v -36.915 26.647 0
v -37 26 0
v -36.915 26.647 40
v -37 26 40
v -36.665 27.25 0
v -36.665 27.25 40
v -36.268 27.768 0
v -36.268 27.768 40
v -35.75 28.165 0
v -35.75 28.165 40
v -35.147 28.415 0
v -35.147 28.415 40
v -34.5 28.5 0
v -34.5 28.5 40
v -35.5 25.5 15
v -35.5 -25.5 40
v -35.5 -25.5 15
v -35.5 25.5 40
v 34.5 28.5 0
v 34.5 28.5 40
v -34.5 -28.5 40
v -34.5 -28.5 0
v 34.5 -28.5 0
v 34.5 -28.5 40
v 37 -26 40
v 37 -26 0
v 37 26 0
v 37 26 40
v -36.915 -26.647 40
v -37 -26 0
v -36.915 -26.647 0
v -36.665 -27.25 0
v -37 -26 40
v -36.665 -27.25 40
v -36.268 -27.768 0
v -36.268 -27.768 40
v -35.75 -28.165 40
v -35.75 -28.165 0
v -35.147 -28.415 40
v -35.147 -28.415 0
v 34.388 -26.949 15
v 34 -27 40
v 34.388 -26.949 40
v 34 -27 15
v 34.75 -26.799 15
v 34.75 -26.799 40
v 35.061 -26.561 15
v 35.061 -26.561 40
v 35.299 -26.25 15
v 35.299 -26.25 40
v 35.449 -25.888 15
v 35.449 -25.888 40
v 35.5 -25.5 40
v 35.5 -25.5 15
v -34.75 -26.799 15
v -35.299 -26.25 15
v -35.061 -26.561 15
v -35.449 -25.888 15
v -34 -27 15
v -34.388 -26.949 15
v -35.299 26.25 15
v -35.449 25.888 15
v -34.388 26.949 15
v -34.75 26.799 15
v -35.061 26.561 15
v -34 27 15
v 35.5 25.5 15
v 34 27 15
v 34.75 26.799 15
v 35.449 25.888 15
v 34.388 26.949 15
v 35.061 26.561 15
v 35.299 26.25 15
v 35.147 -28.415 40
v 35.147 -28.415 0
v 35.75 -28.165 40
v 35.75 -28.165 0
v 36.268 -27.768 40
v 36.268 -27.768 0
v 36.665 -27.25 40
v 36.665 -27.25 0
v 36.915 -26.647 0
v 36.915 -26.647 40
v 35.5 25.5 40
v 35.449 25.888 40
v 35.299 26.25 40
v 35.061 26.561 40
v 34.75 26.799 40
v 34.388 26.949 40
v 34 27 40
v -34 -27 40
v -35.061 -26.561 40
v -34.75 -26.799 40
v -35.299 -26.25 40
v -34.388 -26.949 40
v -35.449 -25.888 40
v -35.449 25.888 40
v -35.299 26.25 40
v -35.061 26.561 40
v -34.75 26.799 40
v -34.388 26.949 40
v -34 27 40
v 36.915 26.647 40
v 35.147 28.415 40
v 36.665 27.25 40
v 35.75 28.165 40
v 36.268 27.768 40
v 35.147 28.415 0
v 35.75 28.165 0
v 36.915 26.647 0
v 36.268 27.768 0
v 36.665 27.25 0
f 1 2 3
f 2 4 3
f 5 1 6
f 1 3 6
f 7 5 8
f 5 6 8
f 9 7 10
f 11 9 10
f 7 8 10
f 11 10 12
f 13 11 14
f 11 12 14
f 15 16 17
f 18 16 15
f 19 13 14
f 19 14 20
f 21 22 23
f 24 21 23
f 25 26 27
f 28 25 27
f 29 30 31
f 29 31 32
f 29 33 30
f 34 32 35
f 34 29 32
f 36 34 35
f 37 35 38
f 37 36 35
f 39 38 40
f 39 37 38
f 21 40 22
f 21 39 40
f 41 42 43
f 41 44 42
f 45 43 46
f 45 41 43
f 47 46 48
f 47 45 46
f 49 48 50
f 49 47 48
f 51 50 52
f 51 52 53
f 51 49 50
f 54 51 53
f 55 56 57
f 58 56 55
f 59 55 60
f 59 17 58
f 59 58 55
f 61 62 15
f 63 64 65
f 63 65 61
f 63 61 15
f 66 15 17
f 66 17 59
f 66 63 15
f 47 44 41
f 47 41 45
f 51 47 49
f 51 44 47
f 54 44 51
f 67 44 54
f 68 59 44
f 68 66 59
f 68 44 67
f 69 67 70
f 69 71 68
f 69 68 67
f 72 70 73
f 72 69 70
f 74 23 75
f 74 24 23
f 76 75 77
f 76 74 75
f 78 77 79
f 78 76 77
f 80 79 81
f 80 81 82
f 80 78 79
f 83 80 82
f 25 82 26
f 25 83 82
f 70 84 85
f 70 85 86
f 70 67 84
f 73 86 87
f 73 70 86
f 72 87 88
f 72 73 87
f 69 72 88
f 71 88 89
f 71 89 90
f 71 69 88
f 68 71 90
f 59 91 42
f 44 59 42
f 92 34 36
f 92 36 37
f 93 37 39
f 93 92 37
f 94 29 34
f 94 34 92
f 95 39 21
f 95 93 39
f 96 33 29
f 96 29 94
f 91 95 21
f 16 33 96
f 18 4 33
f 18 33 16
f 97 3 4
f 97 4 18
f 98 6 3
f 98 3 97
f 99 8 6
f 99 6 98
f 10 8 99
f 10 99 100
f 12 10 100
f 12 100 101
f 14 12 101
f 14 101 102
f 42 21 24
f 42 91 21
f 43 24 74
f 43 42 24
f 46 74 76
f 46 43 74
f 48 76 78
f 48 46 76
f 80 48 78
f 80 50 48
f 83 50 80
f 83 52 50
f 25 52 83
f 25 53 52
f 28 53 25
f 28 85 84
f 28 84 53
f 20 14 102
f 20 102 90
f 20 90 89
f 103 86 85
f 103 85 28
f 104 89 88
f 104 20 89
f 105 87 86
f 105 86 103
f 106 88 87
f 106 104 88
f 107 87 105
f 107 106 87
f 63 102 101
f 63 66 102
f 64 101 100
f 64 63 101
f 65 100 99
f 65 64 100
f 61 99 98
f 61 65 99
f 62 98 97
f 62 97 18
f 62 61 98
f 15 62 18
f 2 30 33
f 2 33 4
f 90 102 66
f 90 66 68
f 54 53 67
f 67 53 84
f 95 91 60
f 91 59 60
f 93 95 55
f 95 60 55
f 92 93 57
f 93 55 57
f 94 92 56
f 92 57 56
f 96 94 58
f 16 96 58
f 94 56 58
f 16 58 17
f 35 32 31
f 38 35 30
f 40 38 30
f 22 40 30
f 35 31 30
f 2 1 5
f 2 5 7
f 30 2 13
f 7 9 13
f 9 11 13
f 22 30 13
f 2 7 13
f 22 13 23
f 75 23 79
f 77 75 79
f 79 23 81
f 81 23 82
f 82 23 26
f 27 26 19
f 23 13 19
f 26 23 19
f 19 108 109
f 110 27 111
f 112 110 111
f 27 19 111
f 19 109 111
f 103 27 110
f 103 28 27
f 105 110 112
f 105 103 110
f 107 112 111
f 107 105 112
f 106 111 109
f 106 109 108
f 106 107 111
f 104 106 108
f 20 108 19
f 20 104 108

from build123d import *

# Parameters (mm, degrees)
F0_W     = 74
F0_H     = 57
F1_DEPTH = 40
F2_R     = 2.5
F3_W     = 71
F3_H     = 54
F4_DEPTH = 25
F5_R     = 1.5


with BuildPart() as f1:
    # F0 (on Top) → F1 (new body)
    with BuildSketch(Plane.XY):
        Rectangle(F0_W, F0_H)
    extrude(amount=F1_DEPTH)

    # F2
    f2_edges = [f1.edges().sort_by_distance(p)[0] for p in [
        (37, 28.5, 20),
        (37, -28.5, 20),
        (-37, -28.5, 20),
        (-37, 28.5, 20),
    ]]
    fillet(f2_edges, radius=F2_R)

    # F3 (on face) → F4 (cut)
    with BuildSketch(Plane.XY.offset(40)):
        Rectangle(F3_W, F3_H)
    extrude(amount=-F4_DEPTH, mode=Mode.SUBTRACT)

    # F5
    f5_edges = [f1.edges().sort_by_distance(p)[0] for p in [
        (35.5, -27, 27.5),
        (-35.5, -27, 27.5),
        (-35.5, 27, 27.5),
        (35.5, 27, 27.5),
    ]]
    fillet(f5_edges, radius=F5_R)


solid = f1.part
